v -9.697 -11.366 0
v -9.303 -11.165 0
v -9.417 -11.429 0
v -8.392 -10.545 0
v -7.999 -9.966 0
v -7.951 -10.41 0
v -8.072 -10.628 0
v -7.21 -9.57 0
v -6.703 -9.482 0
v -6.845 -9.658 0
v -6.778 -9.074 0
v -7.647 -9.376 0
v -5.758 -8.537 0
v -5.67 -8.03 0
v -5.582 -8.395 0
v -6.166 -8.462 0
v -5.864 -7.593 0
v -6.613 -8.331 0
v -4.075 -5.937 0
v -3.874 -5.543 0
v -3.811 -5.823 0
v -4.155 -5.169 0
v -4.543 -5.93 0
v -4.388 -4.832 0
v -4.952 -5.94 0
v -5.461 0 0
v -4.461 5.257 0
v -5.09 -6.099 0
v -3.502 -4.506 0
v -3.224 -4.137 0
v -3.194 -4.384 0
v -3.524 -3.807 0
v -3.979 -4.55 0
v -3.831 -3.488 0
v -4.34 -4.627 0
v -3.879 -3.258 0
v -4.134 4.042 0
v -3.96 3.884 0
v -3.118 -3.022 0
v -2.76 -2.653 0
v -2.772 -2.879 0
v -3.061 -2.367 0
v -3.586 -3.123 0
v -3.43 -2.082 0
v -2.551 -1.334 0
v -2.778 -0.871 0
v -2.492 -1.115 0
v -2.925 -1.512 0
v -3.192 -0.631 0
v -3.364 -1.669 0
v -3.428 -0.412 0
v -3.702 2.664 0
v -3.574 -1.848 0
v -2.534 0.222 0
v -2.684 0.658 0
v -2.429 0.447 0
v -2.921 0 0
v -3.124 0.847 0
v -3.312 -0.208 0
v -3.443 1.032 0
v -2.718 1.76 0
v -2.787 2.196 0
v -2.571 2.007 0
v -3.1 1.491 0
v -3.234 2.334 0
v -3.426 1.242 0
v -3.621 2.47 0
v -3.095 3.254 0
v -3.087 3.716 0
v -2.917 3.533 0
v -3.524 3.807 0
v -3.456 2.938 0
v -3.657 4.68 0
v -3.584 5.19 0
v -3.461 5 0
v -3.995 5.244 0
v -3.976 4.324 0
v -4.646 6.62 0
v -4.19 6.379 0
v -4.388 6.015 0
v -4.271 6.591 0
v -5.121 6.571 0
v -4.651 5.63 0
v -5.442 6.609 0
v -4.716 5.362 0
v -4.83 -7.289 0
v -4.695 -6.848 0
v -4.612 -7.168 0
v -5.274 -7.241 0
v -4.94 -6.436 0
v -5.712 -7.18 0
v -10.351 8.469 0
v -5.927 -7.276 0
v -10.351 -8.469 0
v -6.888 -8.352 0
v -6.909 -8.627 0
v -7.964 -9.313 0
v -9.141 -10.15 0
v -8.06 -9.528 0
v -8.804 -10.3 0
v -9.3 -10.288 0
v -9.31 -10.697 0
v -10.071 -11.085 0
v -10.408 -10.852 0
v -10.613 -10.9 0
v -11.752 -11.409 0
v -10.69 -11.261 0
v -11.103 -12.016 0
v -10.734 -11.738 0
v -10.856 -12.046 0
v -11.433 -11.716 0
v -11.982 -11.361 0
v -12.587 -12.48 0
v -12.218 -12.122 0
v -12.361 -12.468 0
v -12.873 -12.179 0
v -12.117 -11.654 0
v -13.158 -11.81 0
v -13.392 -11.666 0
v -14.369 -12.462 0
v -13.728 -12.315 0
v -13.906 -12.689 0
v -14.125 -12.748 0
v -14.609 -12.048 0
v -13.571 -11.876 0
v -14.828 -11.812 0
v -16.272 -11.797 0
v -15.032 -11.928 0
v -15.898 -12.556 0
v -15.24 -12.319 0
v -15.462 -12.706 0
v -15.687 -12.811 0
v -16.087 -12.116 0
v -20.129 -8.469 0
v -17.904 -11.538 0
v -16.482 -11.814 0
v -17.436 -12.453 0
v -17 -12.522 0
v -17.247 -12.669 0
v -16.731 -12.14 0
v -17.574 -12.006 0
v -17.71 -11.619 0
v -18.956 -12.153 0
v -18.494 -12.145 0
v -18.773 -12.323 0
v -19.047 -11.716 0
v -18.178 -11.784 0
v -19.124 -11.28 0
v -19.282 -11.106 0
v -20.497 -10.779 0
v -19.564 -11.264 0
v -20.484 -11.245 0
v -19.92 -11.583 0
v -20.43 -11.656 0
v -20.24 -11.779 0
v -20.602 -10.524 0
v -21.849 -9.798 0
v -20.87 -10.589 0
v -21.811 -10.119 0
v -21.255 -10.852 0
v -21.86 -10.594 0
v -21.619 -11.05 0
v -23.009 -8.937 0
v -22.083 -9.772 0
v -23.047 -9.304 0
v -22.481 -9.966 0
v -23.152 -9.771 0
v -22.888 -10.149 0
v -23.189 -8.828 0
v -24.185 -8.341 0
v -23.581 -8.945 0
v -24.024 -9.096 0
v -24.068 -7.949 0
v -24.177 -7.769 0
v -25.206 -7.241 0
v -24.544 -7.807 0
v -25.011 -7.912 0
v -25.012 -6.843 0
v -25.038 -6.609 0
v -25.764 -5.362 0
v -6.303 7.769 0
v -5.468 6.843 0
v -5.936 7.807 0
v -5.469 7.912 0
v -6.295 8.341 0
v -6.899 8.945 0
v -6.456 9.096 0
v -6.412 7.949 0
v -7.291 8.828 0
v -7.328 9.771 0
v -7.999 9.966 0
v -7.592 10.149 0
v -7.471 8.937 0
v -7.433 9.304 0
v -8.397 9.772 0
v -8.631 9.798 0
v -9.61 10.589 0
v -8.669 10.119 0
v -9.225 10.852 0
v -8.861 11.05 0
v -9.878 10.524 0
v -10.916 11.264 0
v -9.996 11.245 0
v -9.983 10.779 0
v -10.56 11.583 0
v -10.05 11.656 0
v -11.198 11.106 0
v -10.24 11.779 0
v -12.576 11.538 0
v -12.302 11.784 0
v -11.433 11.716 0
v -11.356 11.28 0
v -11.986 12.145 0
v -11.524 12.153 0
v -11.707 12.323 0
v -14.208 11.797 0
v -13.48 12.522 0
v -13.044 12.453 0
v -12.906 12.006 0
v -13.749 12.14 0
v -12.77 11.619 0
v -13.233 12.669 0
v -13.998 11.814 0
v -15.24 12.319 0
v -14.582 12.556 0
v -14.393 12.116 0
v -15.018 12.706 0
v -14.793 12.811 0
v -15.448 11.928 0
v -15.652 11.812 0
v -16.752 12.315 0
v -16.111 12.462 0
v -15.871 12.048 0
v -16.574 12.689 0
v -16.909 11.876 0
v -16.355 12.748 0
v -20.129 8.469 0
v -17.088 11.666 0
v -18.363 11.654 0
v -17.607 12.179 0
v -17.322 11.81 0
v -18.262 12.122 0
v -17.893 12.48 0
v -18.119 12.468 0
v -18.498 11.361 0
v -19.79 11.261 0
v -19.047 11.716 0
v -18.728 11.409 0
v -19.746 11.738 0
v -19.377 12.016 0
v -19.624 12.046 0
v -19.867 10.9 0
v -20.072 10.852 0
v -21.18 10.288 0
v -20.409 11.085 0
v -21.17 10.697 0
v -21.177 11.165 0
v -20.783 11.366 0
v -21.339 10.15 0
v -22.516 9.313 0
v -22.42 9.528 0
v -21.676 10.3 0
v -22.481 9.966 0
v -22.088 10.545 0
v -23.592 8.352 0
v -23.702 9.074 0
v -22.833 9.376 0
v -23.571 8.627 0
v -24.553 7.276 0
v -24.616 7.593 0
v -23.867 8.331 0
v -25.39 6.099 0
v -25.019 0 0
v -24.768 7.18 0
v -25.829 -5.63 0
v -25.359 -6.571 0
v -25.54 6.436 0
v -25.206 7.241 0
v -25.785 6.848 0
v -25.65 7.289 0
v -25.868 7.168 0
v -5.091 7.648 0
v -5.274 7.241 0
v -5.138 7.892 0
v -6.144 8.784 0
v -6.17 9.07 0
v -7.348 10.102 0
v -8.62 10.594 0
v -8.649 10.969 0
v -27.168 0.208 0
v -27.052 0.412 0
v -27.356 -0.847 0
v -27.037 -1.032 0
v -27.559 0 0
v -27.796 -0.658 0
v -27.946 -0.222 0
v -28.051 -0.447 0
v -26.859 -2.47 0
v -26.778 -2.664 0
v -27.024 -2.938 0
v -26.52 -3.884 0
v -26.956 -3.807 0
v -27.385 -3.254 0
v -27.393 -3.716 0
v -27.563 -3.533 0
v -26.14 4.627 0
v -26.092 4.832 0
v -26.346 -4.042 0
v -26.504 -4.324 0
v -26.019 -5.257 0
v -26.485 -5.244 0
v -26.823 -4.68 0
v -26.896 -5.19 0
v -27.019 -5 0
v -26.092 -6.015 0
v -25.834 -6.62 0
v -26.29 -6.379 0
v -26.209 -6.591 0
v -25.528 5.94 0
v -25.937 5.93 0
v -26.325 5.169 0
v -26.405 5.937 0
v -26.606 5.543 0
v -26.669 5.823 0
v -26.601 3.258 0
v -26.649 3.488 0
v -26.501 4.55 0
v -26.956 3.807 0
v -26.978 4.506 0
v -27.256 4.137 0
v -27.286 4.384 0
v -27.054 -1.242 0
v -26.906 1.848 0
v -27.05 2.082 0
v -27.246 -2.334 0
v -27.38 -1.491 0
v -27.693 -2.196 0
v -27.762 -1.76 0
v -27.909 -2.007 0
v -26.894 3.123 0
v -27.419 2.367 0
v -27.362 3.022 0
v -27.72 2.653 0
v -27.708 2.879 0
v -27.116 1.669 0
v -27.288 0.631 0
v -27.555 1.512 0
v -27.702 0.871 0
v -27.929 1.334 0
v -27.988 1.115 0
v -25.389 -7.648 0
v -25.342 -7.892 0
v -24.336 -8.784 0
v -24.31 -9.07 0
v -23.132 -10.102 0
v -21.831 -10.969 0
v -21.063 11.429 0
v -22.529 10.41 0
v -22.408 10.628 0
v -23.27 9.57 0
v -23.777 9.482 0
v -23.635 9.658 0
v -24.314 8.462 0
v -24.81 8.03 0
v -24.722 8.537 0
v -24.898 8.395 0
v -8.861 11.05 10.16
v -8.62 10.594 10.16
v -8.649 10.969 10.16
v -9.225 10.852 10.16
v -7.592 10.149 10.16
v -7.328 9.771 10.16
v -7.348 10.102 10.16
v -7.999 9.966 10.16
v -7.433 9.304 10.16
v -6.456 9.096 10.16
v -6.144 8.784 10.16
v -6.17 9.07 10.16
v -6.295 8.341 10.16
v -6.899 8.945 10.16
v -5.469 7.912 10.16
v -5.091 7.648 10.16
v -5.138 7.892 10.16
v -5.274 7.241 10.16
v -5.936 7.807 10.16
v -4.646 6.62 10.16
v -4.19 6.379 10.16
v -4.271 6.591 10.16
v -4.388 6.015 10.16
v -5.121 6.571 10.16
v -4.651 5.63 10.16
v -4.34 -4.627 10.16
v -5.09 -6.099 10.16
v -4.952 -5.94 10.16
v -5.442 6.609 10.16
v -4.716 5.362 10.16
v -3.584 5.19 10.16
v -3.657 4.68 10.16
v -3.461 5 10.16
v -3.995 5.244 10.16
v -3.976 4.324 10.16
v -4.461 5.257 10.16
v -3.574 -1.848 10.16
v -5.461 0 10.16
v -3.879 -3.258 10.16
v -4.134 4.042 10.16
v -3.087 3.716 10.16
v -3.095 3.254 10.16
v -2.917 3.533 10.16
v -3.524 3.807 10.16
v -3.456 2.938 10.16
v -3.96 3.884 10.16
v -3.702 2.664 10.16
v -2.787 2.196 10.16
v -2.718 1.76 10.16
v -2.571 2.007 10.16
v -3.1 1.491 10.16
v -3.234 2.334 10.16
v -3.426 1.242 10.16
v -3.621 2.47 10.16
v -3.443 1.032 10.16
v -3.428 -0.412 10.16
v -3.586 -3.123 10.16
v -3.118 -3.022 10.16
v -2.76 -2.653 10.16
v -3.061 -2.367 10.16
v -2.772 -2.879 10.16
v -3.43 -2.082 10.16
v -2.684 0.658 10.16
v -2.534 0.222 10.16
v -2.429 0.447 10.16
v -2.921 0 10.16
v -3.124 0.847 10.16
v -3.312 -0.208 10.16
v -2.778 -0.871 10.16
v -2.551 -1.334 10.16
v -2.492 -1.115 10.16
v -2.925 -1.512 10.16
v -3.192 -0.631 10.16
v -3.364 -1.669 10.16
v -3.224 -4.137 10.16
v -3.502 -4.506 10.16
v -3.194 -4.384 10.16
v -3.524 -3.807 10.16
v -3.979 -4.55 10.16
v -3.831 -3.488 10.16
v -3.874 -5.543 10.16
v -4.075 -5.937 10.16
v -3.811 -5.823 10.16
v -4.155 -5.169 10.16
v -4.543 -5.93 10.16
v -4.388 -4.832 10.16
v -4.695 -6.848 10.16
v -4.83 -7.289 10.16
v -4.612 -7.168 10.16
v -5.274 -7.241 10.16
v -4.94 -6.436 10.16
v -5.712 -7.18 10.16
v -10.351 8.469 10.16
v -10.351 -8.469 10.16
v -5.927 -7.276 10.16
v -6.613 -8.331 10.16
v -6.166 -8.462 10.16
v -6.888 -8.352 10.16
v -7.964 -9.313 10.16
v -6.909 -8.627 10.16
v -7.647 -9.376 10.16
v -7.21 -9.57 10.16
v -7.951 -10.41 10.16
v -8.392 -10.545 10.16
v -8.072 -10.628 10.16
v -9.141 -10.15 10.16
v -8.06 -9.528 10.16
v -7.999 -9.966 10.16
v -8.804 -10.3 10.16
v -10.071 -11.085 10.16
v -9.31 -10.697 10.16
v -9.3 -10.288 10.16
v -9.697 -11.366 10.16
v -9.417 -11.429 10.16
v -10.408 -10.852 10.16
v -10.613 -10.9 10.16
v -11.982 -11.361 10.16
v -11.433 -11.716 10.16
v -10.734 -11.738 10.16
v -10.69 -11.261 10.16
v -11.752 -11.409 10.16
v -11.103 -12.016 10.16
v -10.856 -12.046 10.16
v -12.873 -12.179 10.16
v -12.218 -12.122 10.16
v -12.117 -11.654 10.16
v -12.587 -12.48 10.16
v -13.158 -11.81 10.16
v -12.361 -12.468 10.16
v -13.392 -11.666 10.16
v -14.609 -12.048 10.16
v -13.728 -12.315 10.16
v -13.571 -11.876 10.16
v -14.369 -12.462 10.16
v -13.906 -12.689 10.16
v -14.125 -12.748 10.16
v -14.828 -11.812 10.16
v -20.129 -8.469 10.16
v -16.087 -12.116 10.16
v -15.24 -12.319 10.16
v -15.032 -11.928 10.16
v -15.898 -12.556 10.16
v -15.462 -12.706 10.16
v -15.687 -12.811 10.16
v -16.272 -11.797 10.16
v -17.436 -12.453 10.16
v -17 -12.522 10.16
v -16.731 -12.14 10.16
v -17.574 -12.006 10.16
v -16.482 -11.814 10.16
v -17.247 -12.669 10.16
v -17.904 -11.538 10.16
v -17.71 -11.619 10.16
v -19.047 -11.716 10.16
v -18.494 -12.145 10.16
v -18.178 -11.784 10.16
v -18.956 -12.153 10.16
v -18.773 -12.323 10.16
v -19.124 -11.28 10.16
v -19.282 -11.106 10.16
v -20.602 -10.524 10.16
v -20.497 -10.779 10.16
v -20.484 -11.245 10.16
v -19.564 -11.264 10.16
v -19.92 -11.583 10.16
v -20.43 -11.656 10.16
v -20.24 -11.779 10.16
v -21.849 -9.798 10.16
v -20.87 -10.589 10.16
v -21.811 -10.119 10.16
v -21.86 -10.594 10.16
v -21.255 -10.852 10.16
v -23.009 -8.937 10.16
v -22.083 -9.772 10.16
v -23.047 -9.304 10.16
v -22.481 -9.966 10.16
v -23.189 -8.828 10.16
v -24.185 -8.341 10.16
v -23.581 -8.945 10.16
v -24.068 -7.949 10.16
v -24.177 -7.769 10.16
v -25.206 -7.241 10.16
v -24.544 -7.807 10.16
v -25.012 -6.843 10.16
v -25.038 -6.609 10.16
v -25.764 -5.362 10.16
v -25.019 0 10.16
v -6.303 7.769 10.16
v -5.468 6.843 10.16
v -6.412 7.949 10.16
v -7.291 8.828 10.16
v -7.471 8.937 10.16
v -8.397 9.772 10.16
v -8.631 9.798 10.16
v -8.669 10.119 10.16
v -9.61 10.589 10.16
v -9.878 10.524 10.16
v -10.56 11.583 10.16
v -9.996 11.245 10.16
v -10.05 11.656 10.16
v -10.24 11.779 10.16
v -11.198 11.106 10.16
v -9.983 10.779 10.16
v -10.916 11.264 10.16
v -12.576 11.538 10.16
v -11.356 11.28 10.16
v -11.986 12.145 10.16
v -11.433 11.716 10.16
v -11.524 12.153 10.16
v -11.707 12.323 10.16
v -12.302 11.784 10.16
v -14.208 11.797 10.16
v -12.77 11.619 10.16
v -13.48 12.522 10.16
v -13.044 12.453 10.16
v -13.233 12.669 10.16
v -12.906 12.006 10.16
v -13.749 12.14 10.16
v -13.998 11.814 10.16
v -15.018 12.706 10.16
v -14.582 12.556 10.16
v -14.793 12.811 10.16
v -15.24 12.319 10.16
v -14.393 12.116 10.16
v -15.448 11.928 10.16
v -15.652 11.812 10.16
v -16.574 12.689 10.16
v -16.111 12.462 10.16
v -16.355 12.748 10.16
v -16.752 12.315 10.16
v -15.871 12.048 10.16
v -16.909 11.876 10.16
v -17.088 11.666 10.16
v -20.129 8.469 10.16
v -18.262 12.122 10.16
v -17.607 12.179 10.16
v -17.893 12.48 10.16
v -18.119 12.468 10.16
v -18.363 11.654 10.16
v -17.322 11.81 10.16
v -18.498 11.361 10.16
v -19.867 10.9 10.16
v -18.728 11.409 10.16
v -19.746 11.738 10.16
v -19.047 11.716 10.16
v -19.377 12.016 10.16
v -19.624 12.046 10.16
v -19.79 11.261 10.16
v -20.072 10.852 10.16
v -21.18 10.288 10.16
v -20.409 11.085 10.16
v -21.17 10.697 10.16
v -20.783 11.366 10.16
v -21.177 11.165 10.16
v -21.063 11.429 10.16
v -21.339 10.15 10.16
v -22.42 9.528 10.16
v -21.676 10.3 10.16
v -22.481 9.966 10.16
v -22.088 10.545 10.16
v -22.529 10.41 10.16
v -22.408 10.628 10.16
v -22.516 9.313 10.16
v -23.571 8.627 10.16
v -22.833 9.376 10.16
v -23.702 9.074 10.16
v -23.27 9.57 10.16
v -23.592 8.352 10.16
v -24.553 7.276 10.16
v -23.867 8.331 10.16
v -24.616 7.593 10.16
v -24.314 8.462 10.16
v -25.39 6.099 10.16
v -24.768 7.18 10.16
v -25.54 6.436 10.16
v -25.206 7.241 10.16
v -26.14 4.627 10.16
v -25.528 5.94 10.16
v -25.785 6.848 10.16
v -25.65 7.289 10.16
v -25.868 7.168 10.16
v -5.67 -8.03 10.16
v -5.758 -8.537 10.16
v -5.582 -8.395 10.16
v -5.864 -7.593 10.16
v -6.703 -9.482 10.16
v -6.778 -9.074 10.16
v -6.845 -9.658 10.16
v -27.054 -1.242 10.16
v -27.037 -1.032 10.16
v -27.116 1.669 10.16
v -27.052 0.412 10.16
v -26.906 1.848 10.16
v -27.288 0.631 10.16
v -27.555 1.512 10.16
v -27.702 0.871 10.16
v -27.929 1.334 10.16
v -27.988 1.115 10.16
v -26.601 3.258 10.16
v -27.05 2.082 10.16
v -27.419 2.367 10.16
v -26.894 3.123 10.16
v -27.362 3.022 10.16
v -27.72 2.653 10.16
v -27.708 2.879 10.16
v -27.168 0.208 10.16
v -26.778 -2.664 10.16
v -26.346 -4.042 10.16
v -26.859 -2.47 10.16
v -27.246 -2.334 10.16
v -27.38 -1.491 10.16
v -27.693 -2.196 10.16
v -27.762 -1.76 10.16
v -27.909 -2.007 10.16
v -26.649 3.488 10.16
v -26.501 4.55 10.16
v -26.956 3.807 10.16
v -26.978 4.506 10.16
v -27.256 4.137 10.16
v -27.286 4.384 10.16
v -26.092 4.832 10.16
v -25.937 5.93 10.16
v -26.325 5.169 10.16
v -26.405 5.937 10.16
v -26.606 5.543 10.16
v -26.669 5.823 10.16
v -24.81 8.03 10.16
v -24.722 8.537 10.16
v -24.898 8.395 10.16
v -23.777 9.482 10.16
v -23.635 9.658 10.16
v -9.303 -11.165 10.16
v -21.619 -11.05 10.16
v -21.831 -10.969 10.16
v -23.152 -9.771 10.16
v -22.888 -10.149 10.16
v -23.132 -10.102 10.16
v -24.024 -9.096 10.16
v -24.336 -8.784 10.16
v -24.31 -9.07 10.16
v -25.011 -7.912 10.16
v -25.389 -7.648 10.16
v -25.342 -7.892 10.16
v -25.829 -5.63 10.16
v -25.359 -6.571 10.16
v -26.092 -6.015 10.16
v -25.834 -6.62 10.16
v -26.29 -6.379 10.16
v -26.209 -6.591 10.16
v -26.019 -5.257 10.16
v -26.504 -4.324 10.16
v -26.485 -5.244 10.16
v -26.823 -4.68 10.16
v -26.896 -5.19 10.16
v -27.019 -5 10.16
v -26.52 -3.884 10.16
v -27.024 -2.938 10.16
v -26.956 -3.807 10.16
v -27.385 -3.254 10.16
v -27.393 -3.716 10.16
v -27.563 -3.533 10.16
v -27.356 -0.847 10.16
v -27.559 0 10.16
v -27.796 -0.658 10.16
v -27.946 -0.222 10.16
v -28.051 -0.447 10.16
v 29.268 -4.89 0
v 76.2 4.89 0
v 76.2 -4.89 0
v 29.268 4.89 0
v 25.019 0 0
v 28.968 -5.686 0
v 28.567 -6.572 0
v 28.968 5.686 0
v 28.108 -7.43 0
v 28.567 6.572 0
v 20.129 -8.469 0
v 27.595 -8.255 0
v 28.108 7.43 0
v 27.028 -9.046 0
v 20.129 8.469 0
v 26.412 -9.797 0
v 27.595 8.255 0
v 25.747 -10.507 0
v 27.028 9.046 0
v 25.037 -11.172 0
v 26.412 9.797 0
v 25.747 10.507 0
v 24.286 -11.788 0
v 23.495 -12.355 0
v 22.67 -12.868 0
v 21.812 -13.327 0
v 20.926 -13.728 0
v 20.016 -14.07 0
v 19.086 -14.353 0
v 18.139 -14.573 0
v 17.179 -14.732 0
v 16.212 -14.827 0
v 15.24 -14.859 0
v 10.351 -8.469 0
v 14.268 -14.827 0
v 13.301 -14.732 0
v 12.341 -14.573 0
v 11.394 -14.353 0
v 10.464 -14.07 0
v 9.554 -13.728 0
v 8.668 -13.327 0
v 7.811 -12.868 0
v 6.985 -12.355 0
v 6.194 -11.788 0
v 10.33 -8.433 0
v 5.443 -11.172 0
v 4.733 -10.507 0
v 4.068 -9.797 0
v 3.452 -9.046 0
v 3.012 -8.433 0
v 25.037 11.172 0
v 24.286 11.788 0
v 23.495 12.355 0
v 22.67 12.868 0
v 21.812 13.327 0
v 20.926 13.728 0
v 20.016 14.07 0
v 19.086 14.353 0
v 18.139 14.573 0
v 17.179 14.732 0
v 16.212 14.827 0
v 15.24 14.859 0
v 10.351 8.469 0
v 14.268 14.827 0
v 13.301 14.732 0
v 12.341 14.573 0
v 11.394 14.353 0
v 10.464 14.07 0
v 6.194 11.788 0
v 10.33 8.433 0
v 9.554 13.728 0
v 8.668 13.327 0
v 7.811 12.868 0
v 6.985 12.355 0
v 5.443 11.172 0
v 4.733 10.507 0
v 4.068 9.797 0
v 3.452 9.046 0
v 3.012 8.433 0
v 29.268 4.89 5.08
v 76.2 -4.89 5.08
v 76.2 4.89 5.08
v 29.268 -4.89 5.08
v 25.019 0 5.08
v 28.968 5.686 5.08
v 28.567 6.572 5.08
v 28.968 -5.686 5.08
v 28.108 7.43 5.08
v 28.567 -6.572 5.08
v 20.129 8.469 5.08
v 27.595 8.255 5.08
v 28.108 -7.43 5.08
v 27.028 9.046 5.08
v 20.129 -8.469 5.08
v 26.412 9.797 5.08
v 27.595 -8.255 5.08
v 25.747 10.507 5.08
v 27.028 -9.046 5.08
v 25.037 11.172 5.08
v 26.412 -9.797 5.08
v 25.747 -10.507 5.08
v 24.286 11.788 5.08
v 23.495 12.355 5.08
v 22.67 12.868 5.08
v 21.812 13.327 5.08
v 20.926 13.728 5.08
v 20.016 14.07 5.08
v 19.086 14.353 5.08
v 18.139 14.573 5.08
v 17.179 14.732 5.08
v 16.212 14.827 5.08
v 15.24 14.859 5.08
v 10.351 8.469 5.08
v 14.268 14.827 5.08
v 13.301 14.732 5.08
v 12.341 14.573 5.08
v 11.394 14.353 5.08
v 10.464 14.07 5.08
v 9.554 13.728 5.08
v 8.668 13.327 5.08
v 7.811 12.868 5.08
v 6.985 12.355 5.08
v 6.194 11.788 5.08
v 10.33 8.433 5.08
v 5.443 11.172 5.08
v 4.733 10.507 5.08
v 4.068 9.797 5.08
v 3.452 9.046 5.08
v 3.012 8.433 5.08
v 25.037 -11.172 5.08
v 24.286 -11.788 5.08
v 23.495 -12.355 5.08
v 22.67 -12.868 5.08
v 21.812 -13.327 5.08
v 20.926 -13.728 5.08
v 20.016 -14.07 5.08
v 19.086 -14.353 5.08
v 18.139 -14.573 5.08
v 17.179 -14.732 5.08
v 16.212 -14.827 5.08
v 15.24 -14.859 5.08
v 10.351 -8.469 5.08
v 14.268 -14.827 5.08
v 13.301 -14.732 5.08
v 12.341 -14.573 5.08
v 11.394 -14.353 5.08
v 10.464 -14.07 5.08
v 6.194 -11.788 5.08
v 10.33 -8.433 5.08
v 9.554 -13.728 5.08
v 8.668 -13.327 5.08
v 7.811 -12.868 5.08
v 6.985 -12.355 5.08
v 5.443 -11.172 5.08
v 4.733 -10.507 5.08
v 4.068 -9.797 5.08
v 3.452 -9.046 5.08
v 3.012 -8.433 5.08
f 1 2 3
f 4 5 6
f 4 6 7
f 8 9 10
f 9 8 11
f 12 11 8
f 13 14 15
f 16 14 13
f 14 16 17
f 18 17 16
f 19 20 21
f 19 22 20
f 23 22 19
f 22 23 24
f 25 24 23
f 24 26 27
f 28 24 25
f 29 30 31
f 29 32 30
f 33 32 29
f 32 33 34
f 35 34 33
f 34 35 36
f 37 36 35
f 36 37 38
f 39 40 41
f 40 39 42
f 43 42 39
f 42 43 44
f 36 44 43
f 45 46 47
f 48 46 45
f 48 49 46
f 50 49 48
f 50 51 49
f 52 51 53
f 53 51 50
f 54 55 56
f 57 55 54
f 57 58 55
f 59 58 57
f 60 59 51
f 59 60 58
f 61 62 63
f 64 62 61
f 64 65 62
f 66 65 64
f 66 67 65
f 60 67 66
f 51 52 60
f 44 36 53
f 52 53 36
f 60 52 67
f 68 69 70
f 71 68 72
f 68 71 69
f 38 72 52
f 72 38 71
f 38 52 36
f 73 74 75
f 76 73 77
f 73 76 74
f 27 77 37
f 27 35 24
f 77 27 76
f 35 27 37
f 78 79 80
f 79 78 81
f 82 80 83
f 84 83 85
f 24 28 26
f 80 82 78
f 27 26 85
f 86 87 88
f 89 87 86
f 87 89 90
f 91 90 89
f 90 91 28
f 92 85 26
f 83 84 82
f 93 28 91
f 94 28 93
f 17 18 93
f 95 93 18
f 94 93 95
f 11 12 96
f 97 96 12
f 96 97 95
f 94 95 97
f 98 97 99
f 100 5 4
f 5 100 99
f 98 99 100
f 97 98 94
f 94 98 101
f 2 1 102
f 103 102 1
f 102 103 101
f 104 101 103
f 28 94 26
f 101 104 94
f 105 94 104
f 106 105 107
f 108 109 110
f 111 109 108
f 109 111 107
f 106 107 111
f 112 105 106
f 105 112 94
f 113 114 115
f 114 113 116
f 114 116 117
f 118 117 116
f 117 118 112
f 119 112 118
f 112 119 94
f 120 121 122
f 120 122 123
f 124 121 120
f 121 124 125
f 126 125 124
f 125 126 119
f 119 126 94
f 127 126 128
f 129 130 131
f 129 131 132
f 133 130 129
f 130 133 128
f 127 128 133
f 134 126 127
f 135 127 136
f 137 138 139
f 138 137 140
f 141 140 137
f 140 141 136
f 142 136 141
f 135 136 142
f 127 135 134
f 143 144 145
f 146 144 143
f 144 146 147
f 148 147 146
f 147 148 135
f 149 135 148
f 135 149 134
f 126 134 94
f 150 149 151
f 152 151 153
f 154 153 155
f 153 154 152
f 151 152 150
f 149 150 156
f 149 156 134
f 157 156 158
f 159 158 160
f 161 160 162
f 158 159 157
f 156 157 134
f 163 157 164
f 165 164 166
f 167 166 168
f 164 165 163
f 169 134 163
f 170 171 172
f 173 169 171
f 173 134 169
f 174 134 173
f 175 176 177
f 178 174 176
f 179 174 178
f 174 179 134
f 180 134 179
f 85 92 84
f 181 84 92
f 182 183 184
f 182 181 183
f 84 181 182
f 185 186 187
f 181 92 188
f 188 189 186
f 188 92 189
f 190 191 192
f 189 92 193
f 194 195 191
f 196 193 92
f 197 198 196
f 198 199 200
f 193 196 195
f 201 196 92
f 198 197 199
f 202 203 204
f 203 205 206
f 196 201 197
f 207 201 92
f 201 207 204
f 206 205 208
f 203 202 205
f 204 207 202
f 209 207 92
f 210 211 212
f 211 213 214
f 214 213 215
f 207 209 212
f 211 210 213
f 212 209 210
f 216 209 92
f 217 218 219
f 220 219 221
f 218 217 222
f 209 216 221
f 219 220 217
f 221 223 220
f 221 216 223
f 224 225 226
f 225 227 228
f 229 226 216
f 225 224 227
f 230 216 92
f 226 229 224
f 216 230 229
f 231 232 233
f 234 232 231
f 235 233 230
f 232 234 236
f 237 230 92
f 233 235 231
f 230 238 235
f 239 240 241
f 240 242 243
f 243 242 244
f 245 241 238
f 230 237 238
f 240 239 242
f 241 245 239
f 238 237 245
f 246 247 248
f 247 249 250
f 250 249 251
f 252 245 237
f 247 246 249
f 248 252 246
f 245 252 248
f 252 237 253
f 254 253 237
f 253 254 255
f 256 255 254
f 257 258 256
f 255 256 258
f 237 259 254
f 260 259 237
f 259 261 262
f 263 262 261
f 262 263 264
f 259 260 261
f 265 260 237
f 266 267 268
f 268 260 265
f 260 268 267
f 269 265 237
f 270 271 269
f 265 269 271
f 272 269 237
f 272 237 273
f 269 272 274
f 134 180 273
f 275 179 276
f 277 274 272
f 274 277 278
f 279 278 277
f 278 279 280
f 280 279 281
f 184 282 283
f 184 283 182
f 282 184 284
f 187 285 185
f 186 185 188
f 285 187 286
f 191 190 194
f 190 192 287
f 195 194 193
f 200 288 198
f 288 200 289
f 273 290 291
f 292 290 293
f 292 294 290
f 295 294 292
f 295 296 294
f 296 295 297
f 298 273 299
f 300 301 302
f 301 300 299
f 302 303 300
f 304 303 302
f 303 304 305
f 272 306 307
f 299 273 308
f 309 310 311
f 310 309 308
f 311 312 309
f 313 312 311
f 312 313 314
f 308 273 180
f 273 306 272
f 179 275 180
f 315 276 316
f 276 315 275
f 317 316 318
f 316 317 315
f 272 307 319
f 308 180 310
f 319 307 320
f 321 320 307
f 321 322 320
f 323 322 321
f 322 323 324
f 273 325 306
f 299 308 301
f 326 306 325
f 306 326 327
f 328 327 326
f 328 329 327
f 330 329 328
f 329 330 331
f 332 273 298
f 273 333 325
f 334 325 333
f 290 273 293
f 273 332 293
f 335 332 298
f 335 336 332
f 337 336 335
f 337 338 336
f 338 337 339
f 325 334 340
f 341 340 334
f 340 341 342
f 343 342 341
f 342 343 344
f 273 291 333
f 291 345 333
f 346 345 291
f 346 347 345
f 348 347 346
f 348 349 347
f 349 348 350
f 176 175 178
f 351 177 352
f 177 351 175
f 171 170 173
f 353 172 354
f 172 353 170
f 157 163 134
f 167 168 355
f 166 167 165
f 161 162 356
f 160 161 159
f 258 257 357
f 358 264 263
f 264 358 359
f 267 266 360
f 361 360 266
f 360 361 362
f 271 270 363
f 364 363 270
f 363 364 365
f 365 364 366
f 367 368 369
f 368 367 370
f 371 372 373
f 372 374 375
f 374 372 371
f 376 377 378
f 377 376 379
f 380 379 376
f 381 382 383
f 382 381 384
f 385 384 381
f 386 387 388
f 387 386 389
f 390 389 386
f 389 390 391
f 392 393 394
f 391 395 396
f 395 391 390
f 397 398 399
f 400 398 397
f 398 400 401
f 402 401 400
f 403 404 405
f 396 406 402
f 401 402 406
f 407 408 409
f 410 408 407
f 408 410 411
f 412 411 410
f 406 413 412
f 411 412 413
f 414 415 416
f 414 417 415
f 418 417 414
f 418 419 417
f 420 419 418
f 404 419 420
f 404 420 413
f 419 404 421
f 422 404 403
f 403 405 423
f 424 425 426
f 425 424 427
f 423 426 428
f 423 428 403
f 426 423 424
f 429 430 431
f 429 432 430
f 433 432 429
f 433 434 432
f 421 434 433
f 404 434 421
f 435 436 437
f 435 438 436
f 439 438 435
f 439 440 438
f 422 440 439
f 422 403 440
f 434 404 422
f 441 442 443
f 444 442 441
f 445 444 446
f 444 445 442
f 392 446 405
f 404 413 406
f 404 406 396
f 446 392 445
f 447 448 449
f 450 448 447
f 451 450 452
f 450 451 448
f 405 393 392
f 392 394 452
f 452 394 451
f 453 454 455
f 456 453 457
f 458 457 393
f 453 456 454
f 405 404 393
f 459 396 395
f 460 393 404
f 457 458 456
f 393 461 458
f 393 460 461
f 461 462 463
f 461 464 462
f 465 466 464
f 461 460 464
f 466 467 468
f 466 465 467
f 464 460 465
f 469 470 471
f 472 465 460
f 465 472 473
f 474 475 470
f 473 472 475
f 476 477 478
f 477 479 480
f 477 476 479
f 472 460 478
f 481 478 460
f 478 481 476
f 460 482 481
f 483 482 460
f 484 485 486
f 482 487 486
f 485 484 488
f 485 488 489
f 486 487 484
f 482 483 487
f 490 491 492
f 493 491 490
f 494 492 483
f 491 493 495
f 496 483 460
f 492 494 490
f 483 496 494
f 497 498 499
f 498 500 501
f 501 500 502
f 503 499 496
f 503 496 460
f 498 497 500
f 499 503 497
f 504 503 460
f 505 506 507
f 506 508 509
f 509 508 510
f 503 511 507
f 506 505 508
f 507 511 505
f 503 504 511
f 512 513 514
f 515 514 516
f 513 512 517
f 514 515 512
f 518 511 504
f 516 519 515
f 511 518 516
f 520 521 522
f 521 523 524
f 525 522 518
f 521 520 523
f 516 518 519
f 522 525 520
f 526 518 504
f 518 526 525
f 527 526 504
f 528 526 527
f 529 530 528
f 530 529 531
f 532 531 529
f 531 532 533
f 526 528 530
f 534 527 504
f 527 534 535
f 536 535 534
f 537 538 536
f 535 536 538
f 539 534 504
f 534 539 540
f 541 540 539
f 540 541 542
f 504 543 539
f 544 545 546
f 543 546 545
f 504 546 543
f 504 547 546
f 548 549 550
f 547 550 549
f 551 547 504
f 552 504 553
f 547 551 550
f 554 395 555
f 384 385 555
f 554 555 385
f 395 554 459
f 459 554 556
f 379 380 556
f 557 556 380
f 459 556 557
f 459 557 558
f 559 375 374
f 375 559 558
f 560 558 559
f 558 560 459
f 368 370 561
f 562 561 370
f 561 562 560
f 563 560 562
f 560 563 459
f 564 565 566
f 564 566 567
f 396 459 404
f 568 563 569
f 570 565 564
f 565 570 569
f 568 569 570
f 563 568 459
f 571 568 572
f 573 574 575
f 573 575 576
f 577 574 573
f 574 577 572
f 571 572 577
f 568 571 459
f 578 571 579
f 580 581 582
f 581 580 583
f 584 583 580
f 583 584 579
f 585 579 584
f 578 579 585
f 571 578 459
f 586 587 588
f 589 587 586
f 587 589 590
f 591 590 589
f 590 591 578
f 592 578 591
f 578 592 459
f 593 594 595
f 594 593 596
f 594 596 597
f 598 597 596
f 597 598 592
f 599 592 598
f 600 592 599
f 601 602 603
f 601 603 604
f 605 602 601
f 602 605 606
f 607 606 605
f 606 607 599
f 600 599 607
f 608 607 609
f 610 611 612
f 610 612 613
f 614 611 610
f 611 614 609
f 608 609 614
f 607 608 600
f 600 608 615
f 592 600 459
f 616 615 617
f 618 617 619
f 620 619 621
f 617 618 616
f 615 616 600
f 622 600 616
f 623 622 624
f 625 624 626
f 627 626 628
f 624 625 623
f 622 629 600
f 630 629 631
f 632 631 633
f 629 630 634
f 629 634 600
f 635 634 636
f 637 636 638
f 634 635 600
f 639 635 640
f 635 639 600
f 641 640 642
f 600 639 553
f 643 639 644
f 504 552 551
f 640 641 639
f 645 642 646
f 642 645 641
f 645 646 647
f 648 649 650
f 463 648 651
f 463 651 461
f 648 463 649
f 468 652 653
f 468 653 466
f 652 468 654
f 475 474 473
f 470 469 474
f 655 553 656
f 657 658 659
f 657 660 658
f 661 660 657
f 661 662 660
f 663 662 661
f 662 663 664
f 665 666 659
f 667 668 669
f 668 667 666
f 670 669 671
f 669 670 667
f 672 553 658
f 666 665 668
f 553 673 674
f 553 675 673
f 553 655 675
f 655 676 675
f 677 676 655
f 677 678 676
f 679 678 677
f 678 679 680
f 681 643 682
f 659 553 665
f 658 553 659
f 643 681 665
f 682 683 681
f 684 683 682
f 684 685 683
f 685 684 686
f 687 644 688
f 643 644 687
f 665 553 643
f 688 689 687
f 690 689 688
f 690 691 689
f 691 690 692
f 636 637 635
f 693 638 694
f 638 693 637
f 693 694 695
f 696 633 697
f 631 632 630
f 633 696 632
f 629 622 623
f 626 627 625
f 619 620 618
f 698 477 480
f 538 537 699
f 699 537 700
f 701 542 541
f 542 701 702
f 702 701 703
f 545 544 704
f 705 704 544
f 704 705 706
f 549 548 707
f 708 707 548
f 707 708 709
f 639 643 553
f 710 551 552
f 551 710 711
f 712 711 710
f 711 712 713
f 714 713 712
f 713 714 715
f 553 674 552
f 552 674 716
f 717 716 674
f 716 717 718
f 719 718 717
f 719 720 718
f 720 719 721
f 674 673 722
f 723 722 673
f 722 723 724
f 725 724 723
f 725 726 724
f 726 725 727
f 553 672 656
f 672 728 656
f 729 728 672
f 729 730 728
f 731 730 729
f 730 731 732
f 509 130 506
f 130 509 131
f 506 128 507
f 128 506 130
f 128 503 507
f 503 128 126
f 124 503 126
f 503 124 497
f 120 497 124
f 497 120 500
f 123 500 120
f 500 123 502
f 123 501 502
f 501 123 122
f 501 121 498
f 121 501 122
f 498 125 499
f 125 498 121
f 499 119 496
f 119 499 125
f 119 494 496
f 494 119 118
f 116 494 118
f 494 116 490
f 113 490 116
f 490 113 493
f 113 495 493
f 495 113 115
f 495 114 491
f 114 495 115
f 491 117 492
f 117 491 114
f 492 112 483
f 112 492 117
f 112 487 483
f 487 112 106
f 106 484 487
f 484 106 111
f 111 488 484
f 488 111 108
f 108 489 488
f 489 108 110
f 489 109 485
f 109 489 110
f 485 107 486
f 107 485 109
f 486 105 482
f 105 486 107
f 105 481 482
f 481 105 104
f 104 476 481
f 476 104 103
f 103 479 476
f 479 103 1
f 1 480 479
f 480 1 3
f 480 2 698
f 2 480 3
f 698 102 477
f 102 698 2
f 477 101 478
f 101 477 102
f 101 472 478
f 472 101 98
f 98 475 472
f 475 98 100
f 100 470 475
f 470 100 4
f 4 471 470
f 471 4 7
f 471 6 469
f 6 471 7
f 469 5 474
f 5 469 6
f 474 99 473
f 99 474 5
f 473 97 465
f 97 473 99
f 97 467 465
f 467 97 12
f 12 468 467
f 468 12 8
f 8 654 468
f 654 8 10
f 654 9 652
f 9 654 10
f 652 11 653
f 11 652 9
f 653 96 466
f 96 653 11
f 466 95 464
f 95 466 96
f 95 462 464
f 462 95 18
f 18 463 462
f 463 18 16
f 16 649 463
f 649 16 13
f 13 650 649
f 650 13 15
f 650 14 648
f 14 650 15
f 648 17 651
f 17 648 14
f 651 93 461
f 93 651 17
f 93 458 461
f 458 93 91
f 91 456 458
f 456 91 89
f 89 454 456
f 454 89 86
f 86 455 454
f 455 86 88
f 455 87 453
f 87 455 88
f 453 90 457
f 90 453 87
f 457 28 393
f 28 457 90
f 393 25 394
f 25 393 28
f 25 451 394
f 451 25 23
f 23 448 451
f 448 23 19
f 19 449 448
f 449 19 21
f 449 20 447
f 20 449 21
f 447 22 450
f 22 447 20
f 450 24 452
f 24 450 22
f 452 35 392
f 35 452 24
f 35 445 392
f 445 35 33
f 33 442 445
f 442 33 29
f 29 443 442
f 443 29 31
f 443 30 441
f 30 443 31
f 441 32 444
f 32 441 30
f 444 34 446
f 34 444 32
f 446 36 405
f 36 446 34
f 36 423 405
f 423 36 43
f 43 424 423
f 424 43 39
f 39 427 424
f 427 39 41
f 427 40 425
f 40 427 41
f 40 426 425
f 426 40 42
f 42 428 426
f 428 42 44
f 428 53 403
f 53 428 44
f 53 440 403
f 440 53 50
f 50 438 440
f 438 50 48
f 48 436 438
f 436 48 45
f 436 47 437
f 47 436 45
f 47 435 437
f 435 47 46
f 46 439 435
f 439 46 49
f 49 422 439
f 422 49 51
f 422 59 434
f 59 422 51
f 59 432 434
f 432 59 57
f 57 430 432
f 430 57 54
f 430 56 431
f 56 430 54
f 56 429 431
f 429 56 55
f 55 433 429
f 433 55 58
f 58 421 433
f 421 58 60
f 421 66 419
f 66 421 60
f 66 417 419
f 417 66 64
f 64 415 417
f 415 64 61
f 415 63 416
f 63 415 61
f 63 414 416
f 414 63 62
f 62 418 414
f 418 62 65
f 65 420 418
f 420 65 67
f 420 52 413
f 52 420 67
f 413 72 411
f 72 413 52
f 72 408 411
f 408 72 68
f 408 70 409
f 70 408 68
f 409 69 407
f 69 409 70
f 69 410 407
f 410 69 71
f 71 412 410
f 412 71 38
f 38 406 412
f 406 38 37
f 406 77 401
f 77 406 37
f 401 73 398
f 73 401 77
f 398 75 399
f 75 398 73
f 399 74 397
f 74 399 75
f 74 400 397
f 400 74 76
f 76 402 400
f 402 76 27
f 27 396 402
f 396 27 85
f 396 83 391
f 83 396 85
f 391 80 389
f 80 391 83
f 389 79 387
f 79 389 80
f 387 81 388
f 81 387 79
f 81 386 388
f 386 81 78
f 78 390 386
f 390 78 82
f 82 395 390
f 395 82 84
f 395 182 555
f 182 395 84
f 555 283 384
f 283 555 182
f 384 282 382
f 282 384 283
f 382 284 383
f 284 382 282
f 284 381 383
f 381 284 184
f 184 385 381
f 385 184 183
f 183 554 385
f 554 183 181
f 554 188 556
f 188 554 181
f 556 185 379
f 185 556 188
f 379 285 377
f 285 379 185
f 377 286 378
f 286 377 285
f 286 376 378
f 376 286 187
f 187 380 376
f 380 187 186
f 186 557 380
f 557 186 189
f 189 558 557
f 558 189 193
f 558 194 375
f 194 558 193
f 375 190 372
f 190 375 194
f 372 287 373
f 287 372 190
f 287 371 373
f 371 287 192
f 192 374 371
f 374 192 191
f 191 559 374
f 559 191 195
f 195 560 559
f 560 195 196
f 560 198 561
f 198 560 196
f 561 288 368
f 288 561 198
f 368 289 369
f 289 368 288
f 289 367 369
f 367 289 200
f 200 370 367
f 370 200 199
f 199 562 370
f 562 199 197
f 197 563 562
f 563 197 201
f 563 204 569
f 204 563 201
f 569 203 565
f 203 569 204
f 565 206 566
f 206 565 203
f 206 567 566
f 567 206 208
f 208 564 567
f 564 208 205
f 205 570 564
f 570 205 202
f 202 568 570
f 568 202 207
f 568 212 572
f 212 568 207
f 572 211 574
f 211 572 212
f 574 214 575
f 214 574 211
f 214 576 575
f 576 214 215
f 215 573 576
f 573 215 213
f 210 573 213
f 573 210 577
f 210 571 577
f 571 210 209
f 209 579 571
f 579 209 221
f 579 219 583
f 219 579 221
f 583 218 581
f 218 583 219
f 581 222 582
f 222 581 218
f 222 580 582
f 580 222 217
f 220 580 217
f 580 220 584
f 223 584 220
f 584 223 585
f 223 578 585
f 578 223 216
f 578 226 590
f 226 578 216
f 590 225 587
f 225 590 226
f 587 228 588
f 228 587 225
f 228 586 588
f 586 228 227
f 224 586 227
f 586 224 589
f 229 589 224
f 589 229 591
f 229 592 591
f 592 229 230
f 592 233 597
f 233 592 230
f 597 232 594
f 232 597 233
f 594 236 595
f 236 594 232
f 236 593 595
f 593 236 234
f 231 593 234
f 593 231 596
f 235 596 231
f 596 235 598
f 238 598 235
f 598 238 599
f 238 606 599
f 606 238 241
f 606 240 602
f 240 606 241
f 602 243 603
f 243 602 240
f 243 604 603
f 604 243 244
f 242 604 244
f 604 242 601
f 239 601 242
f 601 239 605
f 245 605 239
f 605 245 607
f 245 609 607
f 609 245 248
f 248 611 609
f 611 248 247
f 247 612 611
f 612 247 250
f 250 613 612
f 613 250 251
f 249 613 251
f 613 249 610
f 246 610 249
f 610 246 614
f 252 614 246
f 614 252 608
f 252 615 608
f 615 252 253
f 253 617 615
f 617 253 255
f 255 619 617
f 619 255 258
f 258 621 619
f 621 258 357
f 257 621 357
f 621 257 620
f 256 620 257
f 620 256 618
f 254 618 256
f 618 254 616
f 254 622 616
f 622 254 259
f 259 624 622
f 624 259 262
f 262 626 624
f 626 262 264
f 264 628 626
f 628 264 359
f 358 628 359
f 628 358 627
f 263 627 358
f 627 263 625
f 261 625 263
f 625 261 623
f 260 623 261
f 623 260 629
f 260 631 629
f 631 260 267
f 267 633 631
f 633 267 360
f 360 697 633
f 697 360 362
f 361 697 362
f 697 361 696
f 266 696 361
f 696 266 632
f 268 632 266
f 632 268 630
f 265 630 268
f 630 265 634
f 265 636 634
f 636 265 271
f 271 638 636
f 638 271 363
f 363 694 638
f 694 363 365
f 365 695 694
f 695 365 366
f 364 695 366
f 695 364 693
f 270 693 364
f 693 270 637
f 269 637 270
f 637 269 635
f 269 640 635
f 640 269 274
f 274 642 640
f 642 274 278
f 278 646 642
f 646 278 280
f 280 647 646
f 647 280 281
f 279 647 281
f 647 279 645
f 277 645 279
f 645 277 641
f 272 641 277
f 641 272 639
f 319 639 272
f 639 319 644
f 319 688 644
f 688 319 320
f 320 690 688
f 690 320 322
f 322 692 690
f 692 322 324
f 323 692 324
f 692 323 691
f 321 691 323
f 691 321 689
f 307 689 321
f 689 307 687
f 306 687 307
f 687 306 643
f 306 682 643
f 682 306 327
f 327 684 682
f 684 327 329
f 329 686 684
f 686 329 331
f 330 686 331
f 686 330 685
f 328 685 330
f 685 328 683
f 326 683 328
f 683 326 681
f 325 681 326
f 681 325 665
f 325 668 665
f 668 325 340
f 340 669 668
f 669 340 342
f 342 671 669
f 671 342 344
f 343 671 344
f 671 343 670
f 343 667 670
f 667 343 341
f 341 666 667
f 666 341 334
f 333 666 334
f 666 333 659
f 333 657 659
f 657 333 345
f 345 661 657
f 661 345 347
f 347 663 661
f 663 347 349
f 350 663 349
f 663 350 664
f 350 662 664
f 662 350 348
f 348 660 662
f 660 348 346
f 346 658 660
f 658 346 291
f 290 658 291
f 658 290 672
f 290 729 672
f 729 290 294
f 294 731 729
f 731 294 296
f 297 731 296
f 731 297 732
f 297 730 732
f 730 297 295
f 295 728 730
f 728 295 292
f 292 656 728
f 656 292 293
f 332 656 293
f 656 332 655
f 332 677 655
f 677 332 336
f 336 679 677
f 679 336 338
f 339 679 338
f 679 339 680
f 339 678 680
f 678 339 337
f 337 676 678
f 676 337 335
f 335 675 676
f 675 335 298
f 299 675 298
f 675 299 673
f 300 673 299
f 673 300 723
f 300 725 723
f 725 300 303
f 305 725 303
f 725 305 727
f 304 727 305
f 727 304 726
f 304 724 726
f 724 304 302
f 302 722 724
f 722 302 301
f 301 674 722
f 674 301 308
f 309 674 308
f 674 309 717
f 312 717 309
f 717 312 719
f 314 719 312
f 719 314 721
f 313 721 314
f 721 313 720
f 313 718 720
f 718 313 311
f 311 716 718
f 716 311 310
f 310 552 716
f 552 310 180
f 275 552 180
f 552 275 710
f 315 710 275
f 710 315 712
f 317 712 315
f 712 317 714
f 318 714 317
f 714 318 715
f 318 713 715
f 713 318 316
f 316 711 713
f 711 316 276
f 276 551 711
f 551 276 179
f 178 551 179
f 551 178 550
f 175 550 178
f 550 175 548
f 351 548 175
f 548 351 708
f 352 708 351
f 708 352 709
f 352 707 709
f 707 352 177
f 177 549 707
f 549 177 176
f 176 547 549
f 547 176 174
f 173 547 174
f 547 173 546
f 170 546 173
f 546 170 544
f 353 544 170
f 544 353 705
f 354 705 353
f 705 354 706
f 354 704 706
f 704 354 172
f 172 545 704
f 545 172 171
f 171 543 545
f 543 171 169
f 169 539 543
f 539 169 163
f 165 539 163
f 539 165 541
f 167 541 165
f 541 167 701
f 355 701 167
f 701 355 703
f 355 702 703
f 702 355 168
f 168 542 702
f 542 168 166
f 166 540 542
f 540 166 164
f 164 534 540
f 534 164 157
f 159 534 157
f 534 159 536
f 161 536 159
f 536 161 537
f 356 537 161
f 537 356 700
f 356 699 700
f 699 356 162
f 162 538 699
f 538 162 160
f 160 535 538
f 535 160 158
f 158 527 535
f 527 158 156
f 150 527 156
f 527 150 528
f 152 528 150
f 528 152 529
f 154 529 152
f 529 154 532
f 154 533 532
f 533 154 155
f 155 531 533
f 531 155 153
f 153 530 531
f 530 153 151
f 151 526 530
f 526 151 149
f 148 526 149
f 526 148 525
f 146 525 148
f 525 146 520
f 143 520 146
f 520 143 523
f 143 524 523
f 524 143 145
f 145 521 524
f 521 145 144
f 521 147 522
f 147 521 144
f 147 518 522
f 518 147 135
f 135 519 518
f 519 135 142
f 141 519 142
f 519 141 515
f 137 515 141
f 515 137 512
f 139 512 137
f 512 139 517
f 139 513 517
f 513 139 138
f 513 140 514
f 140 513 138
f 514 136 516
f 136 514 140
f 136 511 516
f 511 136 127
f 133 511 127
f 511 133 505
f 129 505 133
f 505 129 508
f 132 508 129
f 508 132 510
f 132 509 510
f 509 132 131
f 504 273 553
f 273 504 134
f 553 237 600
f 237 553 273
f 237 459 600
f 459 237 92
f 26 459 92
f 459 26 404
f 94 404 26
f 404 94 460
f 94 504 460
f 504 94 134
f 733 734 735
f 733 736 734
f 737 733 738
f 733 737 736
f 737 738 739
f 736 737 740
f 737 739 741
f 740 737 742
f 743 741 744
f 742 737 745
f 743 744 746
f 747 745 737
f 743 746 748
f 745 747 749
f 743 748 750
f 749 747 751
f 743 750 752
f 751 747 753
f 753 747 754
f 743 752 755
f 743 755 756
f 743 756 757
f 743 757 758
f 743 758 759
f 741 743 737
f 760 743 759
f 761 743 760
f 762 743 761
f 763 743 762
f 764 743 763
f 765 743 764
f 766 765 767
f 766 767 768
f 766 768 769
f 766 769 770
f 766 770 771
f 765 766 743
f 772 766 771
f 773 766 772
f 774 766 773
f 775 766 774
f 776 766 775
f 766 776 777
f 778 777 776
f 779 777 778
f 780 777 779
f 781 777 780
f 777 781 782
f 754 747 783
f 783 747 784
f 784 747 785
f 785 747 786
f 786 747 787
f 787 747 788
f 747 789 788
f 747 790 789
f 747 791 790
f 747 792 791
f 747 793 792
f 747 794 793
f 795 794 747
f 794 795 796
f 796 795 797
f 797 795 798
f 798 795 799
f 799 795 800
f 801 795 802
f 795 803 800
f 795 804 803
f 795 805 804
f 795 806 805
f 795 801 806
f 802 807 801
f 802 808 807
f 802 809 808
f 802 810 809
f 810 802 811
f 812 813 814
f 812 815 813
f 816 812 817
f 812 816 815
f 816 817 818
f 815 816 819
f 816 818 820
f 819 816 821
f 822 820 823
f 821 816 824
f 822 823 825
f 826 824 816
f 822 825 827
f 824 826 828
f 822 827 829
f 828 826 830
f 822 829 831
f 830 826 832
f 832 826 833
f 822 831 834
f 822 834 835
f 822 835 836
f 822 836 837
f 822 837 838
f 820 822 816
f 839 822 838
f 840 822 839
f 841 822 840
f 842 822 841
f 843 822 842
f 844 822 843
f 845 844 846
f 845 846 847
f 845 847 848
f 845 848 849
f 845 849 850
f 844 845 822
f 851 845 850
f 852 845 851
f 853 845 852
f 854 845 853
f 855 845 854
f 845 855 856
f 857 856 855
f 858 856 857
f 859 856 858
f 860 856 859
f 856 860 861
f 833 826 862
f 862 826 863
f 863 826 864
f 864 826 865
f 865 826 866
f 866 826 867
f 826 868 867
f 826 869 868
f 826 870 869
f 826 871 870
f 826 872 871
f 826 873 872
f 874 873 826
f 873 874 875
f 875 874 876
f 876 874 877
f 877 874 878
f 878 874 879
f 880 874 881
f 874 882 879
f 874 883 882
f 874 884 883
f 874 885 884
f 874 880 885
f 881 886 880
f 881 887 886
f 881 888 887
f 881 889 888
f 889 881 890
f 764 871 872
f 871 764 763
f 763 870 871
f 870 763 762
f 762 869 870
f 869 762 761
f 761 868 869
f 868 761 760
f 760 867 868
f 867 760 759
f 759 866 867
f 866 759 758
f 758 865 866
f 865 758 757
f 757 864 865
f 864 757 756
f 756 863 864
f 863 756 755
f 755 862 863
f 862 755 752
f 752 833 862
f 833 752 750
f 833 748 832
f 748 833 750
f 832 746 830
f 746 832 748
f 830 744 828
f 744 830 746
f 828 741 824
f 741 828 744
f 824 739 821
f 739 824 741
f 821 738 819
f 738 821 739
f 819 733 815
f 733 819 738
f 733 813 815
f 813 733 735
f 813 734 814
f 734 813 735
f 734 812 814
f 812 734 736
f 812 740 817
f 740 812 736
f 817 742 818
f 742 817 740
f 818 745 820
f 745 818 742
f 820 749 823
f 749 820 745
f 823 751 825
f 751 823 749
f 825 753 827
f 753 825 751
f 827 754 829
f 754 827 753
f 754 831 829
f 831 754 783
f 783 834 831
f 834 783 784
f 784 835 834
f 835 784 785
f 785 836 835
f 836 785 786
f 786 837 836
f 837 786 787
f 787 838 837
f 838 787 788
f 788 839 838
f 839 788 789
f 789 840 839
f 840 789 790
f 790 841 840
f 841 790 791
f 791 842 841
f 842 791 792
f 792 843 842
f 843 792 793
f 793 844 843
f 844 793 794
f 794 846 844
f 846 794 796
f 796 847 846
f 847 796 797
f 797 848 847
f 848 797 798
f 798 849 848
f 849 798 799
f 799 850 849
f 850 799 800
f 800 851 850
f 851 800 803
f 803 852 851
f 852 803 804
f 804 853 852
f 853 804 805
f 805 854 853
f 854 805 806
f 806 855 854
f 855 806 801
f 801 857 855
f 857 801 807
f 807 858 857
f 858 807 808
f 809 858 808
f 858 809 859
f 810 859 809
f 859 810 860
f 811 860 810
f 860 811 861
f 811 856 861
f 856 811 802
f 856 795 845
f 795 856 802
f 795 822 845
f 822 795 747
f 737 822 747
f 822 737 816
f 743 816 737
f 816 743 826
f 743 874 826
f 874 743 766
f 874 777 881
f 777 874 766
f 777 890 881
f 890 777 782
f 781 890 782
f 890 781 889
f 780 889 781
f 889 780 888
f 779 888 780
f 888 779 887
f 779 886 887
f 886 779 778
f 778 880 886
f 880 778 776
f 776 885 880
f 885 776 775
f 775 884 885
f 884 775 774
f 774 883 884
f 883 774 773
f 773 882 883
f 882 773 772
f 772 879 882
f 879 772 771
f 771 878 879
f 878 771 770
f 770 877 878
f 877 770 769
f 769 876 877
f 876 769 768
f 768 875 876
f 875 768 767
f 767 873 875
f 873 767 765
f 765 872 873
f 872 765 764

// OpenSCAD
ViewScale = [0.0254, 0.0254, 0.0254];

clearance = 20;
nutdiameter = 750 + clearance;

function mycircle(r, p) = [ for (a = [0:1:359]) [ (r+p[a]) * cos(a),  (r+p[a]) * sin(a)] ];
function sinewave(r, s) = [ for (a = [0:s:360*s-1]) r * sin(a)];

module lowerwrench()
{
    linear_extrude(400)
    difference()
    {
        polygon(mycircle(nutdiameter/2 + 100, sinewave(20,50)));
        circle(nutdiameter/2, $fn=6);
    }
}

module upperwrench()
{
    linear_extrude(200)
    {
        difference()
        {
            circle(nutdiameter/2+200, $fn=96);
            circle(nutdiameter/2, $fn=6);
            translate([-332, 0, 0])
            square([664, 664], center=true);
        }
        translate([1400, 0, 0])
        square([2000, nutdiameter/2], center=true);
    }
}

module forViewing()
{
    lowerwrench();
    upperwrench();
}

module forPrinting()
{

    translate([-600, 0, 0])
    lowerwrench();
    translate([600, 0, 0])
    upperwrench();
}

scale(ViewScale)
{
//    forViewing();
    forPrinting();
}
